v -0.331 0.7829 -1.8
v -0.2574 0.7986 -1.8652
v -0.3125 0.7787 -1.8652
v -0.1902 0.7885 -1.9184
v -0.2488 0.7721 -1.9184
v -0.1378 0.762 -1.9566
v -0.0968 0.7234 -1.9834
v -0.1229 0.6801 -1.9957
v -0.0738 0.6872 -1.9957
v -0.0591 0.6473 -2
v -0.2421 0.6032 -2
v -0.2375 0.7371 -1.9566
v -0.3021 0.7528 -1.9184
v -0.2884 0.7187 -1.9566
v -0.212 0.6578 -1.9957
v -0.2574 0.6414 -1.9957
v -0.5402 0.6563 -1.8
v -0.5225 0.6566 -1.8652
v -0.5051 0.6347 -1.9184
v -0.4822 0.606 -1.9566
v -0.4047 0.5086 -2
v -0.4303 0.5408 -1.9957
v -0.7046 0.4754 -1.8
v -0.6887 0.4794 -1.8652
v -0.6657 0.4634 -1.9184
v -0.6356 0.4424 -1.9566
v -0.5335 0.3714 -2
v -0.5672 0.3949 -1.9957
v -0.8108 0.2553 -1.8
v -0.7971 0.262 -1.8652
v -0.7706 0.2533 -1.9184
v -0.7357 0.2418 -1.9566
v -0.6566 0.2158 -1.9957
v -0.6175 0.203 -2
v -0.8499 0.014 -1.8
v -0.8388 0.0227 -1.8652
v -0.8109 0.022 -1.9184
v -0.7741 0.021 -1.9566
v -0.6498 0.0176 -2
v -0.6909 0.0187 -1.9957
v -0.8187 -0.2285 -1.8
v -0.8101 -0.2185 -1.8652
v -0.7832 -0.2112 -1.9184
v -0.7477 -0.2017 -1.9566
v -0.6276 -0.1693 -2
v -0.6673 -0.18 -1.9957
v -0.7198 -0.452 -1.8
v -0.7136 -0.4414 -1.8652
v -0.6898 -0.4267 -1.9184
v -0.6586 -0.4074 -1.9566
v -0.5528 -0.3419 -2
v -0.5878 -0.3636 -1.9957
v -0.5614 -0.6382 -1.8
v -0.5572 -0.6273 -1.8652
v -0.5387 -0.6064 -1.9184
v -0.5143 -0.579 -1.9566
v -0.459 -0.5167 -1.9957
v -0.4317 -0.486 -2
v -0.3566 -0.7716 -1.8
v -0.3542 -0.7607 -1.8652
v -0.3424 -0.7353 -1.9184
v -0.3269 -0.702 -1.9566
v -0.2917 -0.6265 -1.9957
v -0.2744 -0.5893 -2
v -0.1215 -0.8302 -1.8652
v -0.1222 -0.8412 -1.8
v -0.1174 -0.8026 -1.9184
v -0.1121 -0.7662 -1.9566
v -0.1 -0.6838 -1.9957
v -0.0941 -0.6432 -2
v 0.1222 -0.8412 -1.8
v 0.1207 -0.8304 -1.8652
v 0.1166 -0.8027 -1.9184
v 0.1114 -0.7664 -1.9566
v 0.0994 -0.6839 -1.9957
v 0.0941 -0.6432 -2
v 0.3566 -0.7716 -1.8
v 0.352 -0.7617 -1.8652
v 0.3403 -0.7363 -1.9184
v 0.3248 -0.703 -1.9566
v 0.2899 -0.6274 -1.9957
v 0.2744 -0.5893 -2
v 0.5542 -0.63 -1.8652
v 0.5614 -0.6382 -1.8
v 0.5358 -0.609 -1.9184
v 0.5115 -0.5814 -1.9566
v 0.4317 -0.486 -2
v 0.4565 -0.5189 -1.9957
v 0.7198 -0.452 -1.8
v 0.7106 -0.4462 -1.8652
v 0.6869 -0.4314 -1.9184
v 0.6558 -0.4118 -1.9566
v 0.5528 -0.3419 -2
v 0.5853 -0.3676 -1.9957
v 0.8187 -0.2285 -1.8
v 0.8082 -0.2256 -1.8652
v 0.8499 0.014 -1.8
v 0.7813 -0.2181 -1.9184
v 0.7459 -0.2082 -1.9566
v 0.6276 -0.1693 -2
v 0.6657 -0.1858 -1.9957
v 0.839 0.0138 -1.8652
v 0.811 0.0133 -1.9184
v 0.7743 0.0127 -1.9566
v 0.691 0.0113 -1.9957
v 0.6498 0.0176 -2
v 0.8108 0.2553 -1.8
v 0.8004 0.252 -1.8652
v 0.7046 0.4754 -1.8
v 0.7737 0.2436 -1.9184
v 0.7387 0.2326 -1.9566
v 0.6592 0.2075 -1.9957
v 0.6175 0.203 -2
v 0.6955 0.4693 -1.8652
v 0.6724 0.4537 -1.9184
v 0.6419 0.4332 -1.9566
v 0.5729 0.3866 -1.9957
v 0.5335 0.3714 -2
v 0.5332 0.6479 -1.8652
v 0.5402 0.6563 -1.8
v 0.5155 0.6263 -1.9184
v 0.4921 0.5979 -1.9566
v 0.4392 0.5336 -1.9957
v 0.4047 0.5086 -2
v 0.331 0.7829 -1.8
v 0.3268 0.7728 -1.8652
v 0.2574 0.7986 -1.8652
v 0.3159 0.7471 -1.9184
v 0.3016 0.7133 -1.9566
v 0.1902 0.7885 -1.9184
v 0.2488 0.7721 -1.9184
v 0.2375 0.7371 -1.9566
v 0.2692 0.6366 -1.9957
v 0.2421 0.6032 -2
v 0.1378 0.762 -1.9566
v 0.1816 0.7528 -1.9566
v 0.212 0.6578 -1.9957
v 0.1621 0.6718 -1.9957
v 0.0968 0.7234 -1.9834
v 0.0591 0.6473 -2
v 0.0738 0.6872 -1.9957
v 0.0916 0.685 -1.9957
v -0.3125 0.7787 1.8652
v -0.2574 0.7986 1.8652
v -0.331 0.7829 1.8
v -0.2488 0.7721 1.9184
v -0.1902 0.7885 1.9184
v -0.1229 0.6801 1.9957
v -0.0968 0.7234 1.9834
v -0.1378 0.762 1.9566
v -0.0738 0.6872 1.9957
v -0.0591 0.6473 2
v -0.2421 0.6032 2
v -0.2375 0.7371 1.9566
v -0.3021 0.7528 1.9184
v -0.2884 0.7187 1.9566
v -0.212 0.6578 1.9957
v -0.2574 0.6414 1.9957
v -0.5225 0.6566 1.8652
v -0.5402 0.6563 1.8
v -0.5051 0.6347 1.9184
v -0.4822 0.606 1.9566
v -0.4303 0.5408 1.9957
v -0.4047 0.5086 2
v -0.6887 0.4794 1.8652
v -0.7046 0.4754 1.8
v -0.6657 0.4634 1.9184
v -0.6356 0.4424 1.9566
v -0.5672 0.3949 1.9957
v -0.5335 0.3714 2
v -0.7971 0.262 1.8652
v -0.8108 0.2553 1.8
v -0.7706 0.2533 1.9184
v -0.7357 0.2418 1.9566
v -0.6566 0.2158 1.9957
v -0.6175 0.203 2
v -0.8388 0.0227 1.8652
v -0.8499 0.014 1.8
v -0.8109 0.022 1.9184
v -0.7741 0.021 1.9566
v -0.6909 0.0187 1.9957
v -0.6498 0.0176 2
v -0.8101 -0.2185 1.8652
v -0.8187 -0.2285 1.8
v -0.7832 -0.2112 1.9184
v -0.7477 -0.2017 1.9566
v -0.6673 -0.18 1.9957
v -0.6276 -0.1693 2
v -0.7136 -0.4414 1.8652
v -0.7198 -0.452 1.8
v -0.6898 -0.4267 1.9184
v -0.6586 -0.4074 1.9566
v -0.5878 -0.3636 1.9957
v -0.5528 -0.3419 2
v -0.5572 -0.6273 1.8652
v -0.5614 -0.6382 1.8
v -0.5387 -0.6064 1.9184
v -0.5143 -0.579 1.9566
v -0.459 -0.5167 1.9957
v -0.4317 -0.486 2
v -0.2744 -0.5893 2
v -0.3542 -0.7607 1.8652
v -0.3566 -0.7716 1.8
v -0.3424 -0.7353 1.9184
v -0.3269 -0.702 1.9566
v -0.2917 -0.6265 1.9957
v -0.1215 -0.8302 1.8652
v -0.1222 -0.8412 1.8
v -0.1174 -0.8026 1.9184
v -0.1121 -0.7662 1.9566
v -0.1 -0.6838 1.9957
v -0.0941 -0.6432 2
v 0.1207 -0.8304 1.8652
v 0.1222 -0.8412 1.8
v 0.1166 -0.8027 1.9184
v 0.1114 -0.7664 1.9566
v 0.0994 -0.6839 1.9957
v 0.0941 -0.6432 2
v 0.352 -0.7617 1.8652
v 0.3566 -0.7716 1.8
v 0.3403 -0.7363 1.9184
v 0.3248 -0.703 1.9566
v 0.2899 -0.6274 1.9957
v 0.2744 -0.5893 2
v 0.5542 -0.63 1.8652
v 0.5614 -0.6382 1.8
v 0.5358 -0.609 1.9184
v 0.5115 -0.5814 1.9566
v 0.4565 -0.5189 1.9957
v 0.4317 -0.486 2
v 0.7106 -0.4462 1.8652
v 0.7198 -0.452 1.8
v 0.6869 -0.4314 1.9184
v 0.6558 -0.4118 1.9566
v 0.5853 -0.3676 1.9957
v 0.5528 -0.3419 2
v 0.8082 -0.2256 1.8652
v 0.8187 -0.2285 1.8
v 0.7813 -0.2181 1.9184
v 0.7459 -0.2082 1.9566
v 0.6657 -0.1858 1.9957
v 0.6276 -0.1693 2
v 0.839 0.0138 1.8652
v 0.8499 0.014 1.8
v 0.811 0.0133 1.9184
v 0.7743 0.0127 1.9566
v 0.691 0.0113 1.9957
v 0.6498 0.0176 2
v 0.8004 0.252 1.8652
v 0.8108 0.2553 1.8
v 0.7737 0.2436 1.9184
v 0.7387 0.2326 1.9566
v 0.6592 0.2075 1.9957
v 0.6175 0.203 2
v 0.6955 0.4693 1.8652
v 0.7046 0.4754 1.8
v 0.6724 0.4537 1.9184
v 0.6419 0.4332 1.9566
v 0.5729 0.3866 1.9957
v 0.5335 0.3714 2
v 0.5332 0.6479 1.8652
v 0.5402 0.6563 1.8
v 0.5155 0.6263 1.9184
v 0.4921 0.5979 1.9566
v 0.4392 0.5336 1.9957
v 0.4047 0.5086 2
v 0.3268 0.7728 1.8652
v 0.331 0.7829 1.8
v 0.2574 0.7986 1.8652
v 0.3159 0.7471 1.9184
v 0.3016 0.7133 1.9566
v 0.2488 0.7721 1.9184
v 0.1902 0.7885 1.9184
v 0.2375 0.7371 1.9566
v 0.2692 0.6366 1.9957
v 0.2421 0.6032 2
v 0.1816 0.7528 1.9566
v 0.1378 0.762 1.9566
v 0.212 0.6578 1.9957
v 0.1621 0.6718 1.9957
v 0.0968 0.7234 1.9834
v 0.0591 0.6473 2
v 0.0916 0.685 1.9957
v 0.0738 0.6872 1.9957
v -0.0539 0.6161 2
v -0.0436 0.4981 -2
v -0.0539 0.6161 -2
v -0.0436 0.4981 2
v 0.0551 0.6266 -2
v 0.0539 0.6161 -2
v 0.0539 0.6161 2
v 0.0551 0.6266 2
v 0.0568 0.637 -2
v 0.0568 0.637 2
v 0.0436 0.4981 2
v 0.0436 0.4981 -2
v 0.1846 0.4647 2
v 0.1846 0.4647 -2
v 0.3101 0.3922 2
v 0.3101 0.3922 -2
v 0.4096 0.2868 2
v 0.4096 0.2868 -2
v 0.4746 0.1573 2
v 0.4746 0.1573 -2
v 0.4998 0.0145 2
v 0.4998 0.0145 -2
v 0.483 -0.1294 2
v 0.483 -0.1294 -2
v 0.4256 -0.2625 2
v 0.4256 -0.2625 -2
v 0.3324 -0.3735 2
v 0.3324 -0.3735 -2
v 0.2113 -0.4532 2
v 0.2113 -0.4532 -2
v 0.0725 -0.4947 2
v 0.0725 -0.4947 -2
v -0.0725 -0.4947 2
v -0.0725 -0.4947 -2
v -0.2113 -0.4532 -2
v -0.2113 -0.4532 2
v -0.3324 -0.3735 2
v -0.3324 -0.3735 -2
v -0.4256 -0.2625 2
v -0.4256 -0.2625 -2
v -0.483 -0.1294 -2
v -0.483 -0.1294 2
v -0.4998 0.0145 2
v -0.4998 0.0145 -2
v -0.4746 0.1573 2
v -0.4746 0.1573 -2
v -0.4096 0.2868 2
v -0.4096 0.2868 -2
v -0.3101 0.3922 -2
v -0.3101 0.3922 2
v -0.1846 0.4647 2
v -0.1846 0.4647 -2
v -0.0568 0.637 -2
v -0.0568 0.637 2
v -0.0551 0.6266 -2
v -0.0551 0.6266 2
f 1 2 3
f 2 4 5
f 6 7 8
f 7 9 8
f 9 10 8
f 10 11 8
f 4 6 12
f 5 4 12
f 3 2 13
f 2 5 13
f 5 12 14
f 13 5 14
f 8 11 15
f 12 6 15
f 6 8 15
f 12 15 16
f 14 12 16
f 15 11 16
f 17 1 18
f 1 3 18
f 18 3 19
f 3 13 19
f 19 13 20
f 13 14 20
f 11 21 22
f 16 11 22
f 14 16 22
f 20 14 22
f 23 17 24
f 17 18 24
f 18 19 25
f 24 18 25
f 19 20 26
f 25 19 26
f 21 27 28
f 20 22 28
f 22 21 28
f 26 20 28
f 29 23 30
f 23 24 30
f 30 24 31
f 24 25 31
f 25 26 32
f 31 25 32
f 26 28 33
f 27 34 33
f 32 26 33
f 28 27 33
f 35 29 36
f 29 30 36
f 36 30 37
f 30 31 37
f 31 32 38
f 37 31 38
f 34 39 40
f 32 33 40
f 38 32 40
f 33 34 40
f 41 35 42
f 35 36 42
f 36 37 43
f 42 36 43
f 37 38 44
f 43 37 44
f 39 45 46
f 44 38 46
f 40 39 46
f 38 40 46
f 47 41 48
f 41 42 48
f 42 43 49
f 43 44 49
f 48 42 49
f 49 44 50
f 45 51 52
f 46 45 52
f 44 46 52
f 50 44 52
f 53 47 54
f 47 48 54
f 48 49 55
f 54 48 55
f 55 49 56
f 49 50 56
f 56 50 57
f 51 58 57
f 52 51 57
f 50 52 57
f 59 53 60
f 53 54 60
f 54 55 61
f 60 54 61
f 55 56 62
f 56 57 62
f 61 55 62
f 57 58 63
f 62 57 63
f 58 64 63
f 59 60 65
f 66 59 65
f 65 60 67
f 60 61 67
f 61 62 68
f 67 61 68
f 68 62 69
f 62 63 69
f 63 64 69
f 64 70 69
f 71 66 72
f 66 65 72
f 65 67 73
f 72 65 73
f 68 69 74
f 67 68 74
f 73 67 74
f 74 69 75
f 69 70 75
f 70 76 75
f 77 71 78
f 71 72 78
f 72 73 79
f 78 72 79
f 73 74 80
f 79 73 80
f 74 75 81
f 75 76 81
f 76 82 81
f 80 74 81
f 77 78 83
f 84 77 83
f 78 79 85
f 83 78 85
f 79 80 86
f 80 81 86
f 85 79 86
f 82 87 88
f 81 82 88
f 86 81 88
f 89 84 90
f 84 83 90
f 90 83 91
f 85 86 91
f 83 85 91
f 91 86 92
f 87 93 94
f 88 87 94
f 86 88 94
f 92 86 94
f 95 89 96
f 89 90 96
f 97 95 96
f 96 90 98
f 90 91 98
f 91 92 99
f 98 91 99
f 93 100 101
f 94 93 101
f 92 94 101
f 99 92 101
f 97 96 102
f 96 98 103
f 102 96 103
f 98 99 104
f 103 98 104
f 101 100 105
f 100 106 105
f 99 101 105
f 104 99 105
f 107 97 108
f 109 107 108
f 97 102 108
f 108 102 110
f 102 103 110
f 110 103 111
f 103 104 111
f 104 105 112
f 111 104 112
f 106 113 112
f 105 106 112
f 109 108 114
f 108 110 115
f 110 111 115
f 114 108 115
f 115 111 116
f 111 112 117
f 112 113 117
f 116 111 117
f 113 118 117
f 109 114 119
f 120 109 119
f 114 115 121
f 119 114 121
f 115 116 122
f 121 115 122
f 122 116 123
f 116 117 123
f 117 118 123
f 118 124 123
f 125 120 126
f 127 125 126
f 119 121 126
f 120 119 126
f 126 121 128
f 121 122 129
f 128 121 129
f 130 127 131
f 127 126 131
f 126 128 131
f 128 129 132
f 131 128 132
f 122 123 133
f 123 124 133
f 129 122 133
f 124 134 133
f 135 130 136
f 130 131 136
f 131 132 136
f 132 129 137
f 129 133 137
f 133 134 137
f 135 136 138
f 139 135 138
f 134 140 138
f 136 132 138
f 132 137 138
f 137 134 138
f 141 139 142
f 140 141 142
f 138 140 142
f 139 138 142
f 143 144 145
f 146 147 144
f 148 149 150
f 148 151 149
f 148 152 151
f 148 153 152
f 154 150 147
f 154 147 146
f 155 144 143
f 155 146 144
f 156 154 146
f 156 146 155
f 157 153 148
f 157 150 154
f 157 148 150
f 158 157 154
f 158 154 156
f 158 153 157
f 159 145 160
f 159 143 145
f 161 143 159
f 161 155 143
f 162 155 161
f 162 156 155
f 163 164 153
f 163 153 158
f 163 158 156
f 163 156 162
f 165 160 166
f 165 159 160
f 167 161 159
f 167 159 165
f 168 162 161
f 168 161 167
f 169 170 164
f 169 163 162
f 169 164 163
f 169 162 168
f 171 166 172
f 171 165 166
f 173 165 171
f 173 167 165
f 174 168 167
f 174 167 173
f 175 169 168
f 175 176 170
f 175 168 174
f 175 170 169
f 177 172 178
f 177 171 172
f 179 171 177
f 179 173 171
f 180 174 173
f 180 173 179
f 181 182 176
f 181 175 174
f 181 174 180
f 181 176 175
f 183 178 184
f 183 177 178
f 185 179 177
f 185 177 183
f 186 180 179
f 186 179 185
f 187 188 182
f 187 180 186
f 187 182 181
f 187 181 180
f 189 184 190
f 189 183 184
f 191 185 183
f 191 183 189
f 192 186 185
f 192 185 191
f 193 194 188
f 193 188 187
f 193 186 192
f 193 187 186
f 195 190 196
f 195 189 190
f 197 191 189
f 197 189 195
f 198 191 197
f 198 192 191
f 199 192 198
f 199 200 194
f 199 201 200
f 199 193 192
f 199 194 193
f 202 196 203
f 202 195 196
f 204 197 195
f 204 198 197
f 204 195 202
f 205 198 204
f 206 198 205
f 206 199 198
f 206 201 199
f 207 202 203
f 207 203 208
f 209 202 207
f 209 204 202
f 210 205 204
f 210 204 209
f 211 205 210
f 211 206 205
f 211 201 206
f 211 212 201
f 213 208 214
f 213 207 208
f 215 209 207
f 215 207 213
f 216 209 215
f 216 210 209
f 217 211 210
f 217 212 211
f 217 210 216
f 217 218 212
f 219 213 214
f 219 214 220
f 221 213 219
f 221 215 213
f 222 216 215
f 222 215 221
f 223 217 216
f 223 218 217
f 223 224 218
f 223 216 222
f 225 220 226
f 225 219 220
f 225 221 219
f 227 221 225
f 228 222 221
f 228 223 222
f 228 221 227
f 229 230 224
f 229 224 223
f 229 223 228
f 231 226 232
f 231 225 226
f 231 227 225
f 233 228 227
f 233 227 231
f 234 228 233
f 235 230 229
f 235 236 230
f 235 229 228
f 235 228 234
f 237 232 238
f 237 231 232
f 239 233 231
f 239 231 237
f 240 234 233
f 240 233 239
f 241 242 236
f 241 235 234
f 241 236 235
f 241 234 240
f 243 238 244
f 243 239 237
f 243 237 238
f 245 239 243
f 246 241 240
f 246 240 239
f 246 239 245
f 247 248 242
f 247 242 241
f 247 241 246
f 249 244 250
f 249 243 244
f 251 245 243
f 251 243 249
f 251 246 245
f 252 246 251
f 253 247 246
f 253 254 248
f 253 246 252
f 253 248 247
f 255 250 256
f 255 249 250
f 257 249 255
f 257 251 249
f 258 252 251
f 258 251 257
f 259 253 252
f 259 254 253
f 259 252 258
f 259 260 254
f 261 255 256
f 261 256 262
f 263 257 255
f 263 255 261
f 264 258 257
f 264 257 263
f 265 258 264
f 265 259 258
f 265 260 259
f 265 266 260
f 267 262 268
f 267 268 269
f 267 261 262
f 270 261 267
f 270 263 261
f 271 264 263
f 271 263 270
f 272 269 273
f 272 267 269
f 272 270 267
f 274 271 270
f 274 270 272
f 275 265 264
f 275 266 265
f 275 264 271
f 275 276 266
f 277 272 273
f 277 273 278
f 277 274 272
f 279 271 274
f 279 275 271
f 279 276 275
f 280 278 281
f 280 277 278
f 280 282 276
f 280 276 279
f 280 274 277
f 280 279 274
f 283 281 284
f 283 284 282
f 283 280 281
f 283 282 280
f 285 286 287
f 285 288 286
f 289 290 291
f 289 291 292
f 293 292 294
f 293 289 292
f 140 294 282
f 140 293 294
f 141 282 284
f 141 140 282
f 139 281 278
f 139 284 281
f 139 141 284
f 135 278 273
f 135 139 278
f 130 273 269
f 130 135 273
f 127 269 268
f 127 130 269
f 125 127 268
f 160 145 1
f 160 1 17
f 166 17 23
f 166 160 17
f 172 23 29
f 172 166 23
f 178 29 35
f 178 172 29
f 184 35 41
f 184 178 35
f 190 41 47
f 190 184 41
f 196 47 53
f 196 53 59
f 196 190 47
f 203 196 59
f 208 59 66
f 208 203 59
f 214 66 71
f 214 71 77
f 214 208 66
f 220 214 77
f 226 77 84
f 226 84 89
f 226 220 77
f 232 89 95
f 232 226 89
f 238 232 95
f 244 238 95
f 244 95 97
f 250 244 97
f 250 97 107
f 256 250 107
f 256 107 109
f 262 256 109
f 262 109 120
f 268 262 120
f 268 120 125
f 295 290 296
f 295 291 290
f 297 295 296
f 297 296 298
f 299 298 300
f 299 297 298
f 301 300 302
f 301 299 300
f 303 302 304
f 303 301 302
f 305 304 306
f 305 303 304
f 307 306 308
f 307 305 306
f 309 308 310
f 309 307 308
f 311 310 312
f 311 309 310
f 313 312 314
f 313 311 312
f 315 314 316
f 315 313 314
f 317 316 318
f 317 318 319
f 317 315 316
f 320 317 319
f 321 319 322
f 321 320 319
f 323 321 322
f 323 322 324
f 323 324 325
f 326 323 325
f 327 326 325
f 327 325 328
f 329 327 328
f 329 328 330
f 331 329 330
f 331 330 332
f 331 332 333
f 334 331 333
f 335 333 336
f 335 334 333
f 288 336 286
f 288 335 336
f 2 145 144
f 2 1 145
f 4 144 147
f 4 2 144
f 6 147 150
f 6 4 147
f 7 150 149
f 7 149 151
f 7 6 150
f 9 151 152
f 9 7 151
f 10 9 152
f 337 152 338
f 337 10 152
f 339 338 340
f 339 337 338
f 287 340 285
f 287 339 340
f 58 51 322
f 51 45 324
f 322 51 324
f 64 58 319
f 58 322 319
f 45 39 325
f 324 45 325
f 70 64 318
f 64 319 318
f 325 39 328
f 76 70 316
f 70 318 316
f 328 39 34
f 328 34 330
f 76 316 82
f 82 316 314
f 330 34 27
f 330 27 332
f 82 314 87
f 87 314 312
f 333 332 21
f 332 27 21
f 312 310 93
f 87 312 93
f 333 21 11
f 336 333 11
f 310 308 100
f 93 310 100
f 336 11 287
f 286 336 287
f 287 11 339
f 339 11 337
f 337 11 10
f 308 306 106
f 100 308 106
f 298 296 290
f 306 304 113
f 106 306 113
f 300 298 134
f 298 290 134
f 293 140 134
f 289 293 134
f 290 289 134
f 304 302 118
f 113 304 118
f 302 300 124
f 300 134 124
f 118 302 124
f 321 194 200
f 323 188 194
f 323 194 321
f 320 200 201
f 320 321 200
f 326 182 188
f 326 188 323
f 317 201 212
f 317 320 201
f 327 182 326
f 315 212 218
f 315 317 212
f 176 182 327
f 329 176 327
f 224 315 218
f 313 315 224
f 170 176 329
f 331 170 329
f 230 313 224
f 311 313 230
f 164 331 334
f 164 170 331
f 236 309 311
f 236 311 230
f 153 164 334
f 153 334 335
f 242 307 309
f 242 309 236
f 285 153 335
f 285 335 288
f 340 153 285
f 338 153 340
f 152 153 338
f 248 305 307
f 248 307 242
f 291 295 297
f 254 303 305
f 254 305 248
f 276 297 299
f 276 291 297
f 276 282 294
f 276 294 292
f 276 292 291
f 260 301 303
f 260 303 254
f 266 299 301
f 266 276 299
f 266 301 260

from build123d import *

# Parameters (mm, degrees)
BOSS_EXTRUDE1_DEPTH      = 2
BOSS_EXTRUDE1_DEPTH_BACK = 2
FILLET2_R                = 0.2


with BuildPart() as part:
    # Sketch1 → Boss-Extrude1 (new, two sides: drawn at the far end of the back side and taken through both)
    with BuildSketch(Plane.XY.offset(-BOSS_EXTRUDE1_DEPTH_BACK)):
        with BuildLine():
            Line((0.074082381, 0.846765493), (0.043577871, 0.498097349))
            ThreePointArc((0.043577871, 0.498097349), (0, -0.5), (-0.043577871, 0.498097349))
            Line((-0.043577871, 0.498097349), (-0.074082381, 0.846765493))
            ThreePointArc((-0.074082381, 0.846765493), (0, -0.85), (0.074082381, 0.846765493))
        make_face()
    extrude(amount=BOSS_EXTRUDE1_DEPTH + BOSS_EXTRUDE1_DEPTH_BACK)

    # Fillet2
    fillet2_edges = [part.edges().sort_by_distance(p)[0] for p in [
        (0, -0.85, 2),
        (0, -0.85, -2),
        (0.074082381, 0.846765493, 0),
        (-0.074082381, 0.846765493, 0),
    ]]
    fillet(fillet2_edges, radius=FILLET2_R)


solid = part.part
